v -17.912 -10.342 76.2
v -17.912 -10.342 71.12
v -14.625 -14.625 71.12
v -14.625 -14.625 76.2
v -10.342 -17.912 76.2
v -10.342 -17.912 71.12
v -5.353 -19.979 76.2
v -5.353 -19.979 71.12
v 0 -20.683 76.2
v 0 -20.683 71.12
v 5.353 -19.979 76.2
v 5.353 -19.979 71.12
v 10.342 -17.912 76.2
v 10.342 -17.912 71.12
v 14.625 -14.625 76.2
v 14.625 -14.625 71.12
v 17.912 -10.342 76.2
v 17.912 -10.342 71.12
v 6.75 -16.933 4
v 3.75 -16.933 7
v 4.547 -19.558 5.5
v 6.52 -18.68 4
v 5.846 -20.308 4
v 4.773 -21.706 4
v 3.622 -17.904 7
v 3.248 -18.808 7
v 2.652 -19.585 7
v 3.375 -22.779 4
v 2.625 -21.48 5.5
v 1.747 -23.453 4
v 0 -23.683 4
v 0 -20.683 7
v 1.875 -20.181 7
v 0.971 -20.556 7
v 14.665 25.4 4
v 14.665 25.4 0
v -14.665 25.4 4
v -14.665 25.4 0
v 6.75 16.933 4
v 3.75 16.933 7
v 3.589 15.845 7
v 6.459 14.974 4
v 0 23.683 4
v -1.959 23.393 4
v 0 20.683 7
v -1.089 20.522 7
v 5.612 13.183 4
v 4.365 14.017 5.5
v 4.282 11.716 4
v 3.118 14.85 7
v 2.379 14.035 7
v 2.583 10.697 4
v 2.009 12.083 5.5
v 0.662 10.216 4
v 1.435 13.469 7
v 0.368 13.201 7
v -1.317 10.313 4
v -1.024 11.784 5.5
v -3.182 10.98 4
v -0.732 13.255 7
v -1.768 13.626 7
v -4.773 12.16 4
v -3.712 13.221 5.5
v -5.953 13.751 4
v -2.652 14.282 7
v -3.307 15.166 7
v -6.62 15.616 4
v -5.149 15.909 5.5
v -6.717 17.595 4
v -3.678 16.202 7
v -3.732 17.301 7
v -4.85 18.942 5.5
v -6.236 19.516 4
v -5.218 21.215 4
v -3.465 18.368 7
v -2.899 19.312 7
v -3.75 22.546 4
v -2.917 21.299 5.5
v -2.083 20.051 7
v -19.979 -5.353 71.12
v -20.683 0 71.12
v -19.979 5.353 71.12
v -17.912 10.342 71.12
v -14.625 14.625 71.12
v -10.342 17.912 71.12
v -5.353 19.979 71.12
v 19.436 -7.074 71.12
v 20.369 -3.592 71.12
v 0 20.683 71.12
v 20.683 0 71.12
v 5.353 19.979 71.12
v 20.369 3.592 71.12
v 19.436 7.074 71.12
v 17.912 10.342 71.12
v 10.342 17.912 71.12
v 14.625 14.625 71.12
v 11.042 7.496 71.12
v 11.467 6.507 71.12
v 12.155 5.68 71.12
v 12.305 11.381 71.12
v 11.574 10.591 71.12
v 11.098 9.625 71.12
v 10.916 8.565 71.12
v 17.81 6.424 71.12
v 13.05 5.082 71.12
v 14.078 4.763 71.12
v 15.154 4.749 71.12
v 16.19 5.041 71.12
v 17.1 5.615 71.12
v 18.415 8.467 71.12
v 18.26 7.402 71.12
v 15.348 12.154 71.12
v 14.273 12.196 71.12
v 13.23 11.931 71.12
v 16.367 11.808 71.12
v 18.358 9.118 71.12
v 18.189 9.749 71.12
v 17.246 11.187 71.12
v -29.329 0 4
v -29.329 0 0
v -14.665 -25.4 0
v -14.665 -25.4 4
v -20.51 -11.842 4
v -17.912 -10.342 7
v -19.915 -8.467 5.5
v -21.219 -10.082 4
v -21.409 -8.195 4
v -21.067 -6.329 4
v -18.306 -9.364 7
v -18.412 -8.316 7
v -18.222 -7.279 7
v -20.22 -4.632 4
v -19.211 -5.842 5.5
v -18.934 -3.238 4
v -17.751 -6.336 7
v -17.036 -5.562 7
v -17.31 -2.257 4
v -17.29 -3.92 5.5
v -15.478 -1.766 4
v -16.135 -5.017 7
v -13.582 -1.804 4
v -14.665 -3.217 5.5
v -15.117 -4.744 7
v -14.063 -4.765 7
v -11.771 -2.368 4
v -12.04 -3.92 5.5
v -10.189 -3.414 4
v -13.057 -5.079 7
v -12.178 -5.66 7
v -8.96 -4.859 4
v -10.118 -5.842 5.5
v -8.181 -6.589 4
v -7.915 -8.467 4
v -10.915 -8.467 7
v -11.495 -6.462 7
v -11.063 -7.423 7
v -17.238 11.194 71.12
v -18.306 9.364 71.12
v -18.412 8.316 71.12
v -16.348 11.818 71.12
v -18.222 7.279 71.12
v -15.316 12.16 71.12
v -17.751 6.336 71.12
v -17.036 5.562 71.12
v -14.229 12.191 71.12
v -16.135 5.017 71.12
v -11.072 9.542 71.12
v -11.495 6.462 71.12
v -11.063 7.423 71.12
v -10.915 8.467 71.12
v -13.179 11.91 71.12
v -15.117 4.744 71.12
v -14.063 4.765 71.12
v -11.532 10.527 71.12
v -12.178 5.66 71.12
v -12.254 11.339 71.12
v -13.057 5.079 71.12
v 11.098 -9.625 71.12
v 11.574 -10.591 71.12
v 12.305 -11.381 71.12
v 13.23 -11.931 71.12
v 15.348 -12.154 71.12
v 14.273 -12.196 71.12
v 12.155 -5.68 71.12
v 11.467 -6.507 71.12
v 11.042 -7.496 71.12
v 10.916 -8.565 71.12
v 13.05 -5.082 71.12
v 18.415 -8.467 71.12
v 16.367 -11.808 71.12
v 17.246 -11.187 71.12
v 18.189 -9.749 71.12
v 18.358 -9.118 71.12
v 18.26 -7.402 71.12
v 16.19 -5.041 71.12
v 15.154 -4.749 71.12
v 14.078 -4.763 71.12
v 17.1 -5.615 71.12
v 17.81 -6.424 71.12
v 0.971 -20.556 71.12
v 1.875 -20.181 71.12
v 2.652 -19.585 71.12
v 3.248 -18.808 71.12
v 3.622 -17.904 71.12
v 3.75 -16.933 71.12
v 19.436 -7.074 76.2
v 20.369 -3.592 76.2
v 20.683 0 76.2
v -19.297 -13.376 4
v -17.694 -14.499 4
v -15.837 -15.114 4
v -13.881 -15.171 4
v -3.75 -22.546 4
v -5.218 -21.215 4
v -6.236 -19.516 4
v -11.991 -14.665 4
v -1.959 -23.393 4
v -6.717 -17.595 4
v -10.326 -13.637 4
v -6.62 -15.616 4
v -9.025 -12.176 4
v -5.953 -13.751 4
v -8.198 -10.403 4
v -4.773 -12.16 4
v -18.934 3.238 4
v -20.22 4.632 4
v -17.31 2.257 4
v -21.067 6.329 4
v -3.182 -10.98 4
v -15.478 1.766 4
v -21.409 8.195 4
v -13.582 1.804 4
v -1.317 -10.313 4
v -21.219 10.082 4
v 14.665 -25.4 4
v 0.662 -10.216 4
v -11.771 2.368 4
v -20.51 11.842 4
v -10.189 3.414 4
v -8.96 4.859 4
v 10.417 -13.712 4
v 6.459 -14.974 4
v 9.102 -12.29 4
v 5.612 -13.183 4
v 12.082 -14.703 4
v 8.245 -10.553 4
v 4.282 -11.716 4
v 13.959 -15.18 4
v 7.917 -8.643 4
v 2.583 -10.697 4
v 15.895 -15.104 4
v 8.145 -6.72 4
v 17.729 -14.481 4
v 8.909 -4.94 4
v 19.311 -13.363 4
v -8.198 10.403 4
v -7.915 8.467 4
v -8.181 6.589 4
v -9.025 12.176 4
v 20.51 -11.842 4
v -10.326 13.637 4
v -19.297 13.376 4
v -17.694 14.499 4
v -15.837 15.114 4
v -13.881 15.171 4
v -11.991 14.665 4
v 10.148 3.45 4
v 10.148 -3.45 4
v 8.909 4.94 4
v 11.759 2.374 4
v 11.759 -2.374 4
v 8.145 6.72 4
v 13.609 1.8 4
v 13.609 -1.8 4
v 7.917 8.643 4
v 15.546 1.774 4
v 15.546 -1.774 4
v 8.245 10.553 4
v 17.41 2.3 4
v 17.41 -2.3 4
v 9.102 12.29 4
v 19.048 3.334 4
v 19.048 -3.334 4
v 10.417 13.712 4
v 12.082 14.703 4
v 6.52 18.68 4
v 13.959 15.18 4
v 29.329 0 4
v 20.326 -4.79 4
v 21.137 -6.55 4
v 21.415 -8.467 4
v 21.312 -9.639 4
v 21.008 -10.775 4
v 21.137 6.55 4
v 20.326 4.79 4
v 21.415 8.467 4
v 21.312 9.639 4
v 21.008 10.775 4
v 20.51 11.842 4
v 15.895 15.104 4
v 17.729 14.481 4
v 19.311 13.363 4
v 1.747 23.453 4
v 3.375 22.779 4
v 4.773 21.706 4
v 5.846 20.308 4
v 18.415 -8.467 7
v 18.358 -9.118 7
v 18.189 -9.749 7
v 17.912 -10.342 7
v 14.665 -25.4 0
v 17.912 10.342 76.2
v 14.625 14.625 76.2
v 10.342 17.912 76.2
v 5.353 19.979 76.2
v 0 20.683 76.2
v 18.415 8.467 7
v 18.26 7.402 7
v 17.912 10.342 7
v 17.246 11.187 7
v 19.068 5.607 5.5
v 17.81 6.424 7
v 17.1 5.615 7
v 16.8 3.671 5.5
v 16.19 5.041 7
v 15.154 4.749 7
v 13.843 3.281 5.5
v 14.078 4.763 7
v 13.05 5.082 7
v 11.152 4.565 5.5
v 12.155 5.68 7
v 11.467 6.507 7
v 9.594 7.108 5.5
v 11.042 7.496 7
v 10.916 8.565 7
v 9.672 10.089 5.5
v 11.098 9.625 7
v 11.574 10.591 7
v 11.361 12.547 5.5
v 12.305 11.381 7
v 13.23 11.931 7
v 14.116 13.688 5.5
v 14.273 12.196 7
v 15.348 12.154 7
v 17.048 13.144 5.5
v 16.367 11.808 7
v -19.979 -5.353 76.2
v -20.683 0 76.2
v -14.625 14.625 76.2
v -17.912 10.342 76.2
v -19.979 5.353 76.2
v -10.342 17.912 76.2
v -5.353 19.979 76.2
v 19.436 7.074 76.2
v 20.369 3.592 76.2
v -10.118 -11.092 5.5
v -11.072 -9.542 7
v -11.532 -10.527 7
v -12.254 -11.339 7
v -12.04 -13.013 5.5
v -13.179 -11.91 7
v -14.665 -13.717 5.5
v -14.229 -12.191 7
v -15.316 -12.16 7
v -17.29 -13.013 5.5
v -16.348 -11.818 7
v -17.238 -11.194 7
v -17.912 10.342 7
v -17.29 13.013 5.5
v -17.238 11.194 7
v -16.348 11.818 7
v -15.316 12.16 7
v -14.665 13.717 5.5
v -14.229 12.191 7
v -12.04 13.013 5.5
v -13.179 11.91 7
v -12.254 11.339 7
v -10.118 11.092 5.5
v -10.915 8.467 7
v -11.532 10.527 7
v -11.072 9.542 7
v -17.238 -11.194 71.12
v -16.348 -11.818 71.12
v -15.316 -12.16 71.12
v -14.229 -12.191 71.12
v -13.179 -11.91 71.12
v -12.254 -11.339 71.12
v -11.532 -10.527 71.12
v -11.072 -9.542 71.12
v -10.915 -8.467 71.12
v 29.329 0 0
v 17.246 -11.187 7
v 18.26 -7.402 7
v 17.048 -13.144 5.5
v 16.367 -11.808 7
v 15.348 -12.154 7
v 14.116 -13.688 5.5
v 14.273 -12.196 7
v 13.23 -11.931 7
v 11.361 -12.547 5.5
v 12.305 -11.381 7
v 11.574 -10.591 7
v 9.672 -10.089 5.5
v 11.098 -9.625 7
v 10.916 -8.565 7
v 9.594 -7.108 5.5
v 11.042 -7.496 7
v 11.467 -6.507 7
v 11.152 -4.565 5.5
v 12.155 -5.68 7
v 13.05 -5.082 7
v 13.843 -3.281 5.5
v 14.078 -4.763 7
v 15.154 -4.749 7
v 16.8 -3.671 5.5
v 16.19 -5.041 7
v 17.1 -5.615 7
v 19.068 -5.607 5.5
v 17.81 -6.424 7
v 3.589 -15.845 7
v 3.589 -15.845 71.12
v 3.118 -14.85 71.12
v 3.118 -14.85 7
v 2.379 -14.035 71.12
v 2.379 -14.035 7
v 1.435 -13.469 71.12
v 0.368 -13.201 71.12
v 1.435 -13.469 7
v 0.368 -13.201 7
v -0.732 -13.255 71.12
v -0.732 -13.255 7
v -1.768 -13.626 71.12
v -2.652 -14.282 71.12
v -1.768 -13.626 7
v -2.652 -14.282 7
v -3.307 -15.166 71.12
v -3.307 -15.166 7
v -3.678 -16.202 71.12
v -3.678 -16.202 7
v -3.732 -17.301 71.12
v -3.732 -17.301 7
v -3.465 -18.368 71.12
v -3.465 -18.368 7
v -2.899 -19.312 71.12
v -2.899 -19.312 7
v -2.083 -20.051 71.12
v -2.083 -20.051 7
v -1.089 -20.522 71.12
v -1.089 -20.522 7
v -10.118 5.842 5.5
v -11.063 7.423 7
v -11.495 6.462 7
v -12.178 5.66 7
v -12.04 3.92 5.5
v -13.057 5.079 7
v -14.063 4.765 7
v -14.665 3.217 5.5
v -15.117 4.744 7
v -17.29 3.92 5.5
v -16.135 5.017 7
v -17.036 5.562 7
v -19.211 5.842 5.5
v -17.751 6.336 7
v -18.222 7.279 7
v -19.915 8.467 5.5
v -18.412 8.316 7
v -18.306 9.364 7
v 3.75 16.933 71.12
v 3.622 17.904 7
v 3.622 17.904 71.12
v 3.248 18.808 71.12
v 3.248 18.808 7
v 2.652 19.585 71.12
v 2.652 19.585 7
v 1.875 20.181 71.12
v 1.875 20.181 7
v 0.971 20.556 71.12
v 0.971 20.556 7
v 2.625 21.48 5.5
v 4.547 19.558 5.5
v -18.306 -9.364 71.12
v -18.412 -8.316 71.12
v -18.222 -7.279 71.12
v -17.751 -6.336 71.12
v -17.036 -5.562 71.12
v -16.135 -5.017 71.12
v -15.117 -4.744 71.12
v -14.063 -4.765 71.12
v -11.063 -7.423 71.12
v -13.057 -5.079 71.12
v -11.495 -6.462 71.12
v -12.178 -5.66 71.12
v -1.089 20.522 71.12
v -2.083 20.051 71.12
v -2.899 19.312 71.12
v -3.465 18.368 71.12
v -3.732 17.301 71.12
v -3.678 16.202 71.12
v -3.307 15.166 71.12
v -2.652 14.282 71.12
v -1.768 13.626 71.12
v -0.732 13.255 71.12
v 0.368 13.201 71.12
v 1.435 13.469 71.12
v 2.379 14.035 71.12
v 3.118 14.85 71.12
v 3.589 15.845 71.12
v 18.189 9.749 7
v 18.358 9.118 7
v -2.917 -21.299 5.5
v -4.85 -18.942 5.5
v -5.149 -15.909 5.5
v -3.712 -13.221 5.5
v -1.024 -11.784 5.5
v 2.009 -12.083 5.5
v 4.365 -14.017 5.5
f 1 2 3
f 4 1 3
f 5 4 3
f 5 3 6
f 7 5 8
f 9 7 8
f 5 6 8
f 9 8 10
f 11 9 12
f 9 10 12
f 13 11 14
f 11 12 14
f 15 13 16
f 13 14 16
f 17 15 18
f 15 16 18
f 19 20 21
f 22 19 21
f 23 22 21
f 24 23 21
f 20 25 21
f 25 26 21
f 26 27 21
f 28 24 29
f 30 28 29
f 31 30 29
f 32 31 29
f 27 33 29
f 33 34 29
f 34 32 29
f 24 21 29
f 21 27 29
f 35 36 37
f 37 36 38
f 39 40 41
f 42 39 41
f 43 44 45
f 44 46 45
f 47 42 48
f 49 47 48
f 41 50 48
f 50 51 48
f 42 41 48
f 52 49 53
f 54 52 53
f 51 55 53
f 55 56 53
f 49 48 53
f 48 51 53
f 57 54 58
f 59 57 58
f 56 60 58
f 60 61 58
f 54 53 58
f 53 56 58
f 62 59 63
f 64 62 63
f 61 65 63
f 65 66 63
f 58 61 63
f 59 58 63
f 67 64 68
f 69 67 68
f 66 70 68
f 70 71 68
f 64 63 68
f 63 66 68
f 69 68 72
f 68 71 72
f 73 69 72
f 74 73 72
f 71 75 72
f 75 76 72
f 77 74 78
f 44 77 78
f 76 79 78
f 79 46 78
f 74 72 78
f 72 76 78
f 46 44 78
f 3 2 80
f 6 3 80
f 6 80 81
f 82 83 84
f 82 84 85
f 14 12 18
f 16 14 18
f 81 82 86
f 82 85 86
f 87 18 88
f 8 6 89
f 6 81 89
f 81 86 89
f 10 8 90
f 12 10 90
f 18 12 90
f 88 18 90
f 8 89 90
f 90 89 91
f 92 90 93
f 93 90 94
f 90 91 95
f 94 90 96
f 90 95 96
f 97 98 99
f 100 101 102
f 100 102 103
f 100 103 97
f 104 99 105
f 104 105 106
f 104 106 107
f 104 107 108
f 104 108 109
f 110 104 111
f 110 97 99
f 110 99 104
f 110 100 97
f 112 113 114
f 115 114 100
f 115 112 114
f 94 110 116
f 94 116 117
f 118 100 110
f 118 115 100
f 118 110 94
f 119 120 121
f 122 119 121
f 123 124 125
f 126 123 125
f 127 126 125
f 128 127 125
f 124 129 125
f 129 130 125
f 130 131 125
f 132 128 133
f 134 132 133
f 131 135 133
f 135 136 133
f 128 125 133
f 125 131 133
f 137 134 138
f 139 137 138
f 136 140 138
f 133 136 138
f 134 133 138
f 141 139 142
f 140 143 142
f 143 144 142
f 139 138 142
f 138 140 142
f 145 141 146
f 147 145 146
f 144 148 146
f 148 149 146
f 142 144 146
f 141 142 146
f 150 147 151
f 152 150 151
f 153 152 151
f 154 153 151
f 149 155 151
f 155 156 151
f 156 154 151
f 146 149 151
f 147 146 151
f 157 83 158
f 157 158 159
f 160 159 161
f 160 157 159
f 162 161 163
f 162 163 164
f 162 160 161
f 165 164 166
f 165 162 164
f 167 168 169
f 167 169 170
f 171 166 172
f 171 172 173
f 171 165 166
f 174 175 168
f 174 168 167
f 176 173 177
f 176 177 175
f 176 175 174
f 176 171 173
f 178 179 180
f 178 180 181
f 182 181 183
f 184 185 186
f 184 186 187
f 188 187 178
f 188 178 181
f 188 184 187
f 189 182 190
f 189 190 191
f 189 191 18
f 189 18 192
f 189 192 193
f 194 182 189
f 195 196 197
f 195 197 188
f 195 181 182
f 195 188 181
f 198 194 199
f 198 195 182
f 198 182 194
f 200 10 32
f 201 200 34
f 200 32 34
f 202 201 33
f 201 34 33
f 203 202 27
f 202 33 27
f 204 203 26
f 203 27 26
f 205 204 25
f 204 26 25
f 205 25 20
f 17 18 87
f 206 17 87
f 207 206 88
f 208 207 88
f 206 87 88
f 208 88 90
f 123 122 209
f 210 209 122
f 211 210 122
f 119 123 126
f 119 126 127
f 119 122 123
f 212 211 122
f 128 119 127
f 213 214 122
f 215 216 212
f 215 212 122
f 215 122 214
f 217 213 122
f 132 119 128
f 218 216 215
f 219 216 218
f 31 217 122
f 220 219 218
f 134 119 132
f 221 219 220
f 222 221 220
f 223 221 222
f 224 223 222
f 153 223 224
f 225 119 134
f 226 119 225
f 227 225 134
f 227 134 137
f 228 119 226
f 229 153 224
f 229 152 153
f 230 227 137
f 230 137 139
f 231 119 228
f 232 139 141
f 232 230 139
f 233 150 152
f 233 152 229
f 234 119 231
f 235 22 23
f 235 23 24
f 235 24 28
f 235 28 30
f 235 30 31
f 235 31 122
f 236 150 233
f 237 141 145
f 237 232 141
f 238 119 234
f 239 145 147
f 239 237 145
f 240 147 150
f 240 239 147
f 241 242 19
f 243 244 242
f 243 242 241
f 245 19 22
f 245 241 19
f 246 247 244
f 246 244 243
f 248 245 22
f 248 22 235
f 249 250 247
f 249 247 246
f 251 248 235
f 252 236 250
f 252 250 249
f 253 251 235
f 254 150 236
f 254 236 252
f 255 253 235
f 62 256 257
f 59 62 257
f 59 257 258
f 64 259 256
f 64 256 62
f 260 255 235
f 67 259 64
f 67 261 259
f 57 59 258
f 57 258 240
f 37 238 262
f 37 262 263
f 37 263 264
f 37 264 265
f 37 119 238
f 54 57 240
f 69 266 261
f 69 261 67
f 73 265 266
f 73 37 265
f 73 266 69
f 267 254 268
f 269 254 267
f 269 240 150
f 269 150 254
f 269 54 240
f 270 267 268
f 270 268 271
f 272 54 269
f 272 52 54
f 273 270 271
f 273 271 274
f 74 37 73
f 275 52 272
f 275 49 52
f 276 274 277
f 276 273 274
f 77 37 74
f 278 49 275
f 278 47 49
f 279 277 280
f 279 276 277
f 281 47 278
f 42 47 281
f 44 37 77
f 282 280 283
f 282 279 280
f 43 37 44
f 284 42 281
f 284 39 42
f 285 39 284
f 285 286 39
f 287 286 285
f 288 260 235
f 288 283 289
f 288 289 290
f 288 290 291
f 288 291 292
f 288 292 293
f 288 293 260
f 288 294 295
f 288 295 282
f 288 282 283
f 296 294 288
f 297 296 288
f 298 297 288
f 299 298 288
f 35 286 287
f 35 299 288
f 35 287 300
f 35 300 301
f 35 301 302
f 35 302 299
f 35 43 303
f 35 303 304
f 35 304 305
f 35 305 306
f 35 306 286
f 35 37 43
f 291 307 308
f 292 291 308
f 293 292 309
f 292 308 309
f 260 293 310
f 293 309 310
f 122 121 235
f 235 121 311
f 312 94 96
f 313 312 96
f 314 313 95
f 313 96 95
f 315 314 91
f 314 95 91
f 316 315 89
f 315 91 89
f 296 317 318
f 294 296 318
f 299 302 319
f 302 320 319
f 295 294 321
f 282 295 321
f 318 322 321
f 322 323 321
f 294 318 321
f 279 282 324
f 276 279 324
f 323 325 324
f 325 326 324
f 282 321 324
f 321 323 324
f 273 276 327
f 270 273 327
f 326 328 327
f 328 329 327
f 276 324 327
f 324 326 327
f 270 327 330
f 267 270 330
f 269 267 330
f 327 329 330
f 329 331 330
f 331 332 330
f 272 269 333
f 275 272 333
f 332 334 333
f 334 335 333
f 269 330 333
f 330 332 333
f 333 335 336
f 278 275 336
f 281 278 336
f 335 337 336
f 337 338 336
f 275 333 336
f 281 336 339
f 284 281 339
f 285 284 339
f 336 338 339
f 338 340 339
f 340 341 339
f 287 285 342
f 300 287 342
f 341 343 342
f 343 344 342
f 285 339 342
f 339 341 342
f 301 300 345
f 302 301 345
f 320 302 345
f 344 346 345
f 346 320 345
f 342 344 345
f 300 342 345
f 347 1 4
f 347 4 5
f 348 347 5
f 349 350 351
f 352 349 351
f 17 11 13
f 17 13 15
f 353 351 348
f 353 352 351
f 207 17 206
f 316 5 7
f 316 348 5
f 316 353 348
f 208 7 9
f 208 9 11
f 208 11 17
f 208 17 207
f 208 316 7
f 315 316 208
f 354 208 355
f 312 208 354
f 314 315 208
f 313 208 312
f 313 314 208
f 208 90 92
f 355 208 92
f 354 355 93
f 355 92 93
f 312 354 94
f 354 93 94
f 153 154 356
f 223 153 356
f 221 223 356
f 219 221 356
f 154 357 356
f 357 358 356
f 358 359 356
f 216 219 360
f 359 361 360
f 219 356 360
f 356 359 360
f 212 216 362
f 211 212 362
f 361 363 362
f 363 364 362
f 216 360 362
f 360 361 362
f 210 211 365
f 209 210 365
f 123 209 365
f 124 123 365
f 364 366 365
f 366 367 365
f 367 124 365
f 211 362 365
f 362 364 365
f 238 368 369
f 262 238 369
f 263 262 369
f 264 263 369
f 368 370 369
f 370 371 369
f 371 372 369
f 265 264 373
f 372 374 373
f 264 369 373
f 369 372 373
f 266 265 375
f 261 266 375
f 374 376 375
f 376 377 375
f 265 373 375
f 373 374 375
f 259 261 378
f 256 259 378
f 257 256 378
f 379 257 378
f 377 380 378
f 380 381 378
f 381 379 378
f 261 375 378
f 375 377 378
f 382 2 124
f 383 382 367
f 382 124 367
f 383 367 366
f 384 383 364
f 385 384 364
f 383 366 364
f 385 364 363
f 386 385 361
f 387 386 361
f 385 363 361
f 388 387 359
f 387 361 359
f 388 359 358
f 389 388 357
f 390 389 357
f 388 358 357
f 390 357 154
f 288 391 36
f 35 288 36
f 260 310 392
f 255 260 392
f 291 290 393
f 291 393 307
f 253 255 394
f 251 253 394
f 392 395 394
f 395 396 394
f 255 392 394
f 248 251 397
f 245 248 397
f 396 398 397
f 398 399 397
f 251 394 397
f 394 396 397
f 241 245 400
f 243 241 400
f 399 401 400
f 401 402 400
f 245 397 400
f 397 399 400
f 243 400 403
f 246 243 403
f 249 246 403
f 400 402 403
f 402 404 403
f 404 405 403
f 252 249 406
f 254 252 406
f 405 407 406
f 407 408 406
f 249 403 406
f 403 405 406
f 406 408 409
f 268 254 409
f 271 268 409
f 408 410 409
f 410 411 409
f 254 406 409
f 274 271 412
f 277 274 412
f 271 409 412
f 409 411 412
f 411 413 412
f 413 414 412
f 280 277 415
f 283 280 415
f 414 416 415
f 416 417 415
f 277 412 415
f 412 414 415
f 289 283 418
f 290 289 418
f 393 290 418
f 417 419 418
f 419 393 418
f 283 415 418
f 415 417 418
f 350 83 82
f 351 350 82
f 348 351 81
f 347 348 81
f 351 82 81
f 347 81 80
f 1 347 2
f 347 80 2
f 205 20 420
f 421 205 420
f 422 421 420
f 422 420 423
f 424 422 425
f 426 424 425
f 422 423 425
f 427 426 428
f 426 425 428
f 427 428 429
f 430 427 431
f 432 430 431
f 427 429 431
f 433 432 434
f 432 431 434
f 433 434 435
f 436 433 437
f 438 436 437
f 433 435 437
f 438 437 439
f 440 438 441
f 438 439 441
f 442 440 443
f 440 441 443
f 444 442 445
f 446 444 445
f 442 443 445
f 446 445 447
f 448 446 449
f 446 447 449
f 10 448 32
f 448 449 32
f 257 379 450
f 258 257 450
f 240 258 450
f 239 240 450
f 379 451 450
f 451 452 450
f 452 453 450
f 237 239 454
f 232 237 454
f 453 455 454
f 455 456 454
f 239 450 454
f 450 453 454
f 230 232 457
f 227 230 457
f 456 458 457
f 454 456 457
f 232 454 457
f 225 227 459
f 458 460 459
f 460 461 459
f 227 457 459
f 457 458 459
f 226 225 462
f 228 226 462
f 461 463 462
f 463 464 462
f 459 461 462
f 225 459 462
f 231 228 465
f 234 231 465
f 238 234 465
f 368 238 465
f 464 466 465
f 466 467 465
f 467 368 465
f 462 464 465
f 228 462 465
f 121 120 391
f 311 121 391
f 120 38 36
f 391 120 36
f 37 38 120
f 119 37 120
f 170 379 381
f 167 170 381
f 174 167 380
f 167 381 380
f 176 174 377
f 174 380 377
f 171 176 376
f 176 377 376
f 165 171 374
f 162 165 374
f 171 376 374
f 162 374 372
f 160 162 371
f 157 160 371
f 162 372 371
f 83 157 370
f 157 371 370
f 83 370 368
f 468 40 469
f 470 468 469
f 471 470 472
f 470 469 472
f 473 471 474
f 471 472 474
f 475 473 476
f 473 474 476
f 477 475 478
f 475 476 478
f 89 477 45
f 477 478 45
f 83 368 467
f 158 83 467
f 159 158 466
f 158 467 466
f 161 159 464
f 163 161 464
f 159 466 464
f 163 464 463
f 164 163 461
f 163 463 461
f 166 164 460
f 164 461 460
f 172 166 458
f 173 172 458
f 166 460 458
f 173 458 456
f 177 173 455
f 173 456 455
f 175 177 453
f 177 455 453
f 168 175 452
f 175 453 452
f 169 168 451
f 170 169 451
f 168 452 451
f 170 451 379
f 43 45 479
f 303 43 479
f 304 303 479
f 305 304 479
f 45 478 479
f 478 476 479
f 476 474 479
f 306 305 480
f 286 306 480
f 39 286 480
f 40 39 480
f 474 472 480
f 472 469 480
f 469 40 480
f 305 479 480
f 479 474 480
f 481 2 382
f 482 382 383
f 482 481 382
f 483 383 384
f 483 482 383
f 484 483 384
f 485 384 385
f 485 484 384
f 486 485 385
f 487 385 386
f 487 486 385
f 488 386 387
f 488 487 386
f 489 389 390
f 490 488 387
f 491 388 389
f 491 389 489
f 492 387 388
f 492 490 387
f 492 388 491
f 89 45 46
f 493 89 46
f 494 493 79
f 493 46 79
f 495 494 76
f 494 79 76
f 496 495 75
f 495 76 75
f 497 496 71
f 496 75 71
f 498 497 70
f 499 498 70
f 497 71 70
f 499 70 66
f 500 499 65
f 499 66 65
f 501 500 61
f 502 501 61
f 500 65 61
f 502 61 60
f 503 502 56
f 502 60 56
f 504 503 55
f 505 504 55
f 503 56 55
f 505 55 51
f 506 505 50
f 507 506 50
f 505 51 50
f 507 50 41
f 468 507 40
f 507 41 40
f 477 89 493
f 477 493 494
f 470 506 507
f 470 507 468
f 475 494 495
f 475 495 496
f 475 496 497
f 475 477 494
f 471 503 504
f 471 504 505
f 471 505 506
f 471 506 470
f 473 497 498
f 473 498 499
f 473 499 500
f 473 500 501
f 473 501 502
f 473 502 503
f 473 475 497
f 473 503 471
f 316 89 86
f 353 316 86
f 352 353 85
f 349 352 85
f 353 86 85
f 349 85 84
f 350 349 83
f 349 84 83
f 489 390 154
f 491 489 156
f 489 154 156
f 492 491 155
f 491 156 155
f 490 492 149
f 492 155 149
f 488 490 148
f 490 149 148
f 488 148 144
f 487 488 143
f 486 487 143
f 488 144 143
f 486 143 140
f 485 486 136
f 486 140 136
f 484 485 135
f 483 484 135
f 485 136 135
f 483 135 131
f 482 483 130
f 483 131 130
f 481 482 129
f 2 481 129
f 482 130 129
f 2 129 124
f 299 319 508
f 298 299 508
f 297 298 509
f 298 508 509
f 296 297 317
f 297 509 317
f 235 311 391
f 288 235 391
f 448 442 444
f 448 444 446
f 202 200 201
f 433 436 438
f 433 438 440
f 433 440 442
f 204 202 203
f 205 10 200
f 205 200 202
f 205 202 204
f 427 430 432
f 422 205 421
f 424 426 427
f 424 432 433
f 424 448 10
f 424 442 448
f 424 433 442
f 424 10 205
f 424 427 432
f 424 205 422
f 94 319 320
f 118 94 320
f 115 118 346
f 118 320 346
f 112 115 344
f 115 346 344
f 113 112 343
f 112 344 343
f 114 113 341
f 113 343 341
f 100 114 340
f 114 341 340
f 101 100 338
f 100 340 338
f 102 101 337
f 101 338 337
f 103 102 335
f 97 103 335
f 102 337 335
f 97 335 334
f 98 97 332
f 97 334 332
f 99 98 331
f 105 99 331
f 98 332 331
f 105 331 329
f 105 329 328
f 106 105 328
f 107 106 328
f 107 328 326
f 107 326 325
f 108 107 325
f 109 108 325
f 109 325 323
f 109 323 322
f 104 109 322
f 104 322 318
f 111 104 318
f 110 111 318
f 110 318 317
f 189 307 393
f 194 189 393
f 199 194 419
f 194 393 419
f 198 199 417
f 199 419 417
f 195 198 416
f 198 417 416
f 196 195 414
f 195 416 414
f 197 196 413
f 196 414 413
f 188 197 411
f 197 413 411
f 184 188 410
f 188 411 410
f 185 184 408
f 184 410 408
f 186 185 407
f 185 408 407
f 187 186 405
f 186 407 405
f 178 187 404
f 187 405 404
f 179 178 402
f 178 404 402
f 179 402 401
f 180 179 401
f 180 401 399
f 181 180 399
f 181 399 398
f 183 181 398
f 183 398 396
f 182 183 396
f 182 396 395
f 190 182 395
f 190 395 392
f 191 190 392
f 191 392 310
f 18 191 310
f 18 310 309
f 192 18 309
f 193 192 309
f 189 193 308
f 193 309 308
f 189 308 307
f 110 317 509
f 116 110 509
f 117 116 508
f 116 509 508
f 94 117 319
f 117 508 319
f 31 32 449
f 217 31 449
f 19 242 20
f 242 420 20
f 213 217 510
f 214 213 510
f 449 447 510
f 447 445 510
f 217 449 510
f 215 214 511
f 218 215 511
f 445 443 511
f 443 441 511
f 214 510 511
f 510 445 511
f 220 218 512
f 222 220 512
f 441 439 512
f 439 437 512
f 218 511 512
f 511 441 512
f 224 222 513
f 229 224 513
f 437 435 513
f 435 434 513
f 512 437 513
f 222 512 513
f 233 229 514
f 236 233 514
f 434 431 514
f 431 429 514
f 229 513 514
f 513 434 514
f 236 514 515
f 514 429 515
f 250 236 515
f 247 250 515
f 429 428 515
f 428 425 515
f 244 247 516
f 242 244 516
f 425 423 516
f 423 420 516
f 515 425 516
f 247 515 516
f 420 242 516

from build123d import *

# Parameters (mm, degrees)
F1_DEPTH = 4
F2_DEPTH = 71.12
F3_START = 71.12
F3_DEPTH = 5.08
F4_SIZE  = 3


with BuildPart() as f1:
    # F0 (on Top) → F1 (new body)
    with BuildSketch(Plane.XY):
        Polygon((14.6646968374, 25.4), (-14.6646968374, 25.4), (-29.3293936748, 0), (-14.6646968374, -25.4), (14.6646968374, -25.4), (29.3293936748, 0), align=None)
        with BuildLine():
            ThreePointArc((-17.9122922144, -10.3416664713), (-20.6833333333, 1.129e-07), (-17.9122921015, 10.3416666669))
            ThreePointArc((-17.9122921015, 10.3416666669), (-10.3416666665, 17.9122921017), (0, 20.6833333333))
            ThreePointArc((0, 20.6833333333), (10.3416667666, 17.9122920439), (17.912292217, 10.3416664668))
            ThreePointArc((17.912292217, 10.3416664668), (19.9785658703, 5.3532404714), (20.6833333333, 0))
            ThreePointArc((20.6833333333, 0), (19.9785658556, -5.3532405263), (17.9122921602, -10.3416665652))
            ThreePointArc((17.9122921602, -10.3416665652), (10.3416666949, -17.9122920853), (-5.2e-08, -20.6833333333))
            ThreePointArc((-5.2e-08, -20.6833333333), (-10.3416667868, -17.9122920322), (-17.9122922144, -10.3416664713))
        make_face(mode=Mode.SUBTRACT)
        with BuildLine():
            ThreePointArc((0, 20.6833333333), (-10.3416666665, 17.9122921017), (-17.9122921015, 10.3416666669))
            ThreePointArc((-17.9122921015, 10.3416666669), (-20.6833333333, 1.129e-07), (-17.9122922144, -10.3416664713))
            ThreePointArc((-17.9122922144, -10.3416664713), (-10.3416667868, -17.9122920322), (-5.2e-08, -20.6833333333))
            ThreePointArc((-5.2e-08, -20.6833333333), (10.3416666949, -17.9122920853), (17.9122921602, -10.3416665652))
            ThreePointArc((17.9122921602, -10.3416665652), (19.9785658556, -5.3532405263), (20.6833333333, 0))
            ThreePointArc((20.6833333333, 0), (19.9785658703, 5.3532404714), (17.912292217, 10.3416664668))
            ThreePointArc((17.912292217, 10.3416664668), (10.3416667666, 17.9122920439), (0, 20.6833333333))
        make_face()
        with BuildLine():
            ThreePointArc((-10.9146968374, -8.4666666667), (-13.6941255272, -12.0888885444), (-17.9122922144, -10.3416664713))
            ThreePointArc((-17.9122922144, -10.3416664713), (-15.6352681476, -4.8444447889), (-10.9146968374, -8.4666666667))
        make_face(mode=Mode.SUBTRACT)
        with BuildLine():
            ThreePointArc((3.75, -16.9333333333), (2.6516504111, -19.5849837812), (-5.2e-08, -20.6833333333))
            ThreePointArc((-5.2e-08, -20.6833333333), (-2.6516504111, -14.2816828855), (3.75, -16.9333333333))
        make_face(mode=Mode.SUBTRACT)
        with BuildLine():
            ThreePointArc((18.4146968374, -8.4666666667), (18.2869187012, -9.4372380292), (17.9122921602, -10.3416665652))
            ThreePointArc((17.9122921602, -10.3416665652), (11.0424749737, -7.4960953041), (18.4146968374, -8.4666666667))
        make_face(mode=Mode.SUBTRACT)
        with BuildLine():
            ThreePointArc((-17.9122921015, 10.3416666669), (-13.6941254181, 12.0888885152), (-10.9146968374, 8.4666666667))
            ThreePointArc((-10.9146968374, 8.4666666667), (-15.6352682567, 4.8444448181), (-17.9122921015, 10.3416666669))
        make_face(mode=Mode.SUBTRACT)
        with BuildLine():
            ThreePointArc((18.4146968374, 8.4666666667), (11.042474959, 7.496095359), (17.912292217, 10.3416664668))
            ThreePointArc((17.912292217, 10.3416664668), (18.2869187159, 9.4372379743), (18.4146968374, 8.4666666667))
        make_face(mode=Mode.SUBTRACT)
        with BuildLine():
            ThreePointArc((3.75, 16.9333333333), (-2.6516504294, 14.2816829039), (0, 20.6833333333))
            ThreePointArc((0, 20.6833333333), (2.6516504294, 19.5849837628), (3.75, 16.9333333333))
        make_face(mode=Mode.SUBTRACT)
        with BuildLine():
            ThreePointArc((-17.9122921015, 10.3416666669), (-15.6352682567, 4.8444448181), (-10.9146968374, 8.4666666667))
            ThreePointArc((-10.9146968374, 8.4666666667), (-13.6941254181, 12.0888885152), (-17.9122921015, 10.3416666669))
        make_face()
        with BuildLine():
            ThreePointArc((3.75, 16.9333333333), (2.6516504294, 19.5849837628), (0, 20.6833333333))
            ThreePointArc((0, 20.6833333333), (-2.6516504294, 14.2816829039), (3.75, 16.9333333333))
        make_face()
        with BuildLine():
            ThreePointArc((18.4146968374, 8.4666666667), (18.2869187159, 9.4372379743), (17.912292217, 10.3416664668))
            ThreePointArc((17.912292217, 10.3416664668), (11.042474959, 7.496095359), (18.4146968374, 8.4666666667))
        make_face()
        with BuildLine():
            ThreePointArc((18.4146968374, -8.4666666667), (11.0424749737, -7.4960953041), (17.9122921602, -10.3416665652))
            ThreePointArc((17.9122921602, -10.3416665652), (18.2869187012, -9.4372380292), (18.4146968374, -8.4666666667))
        make_face()
        with BuildLine():
            ThreePointArc((-10.9146968374, -8.4666666667), (-15.6352681476, -4.8444447889), (-17.9122922144, -10.3416664713))
            ThreePointArc((-17.9122922144, -10.3416664713), (-13.6941255272, -12.0888885444), (-10.9146968374, -8.4666666667))
        make_face()
        with BuildLine():
            ThreePointArc((3.75, -16.9333333333), (-2.6516504111, -14.2816828855), (-5.2e-08, -20.6833333333))
            ThreePointArc((-5.2e-08, -20.6833333333), (2.6516504111, -19.5849837812), (3.75, -16.9333333333))
        make_face()
    extrude(amount=F1_DEPTH)

    # F0 (on Top) → F2 (join)
    with BuildSketch(Plane.XY):
        with BuildLine():
            ThreePointArc((3.75, 16.9333333333), (2.6516504294, 19.5849837628), (0, 20.6833333333))
            ThreePointArc((0, 20.6833333333), (-2.6516504294, 14.2816829039), (3.75, 16.9333333333))
        make_face()
        with BuildLine():
            ThreePointArc((-17.9122921015, 10.3416666669), (-15.6352682567, 4.8444448181), (-10.9146968374, 8.4666666667))
            ThreePointArc((-10.9146968374, 8.4666666667), (-13.6941254181, 12.0888885152), (-17.9122921015, 10.3416666669))
        make_face()
        with BuildLine():
            ThreePointArc((18.4146968374, 8.4666666667), (18.2869187159, 9.4372379743), (17.912292217, 10.3416664668))
            ThreePointArc((17.912292217, 10.3416664668), (11.042474959, 7.496095359), (18.4146968374, 8.4666666667))
        make_face()
        with BuildLine():
            ThreePointArc((18.4146968374, -8.4666666667), (11.0424749737, -7.4960953041), (17.9122921602, -10.3416665652))
            ThreePointArc((17.9122921602, -10.3416665652), (18.2869187012, -9.4372380292), (18.4146968374, -8.4666666667))
        make_face()
        with BuildLine():
            ThreePointArc((3.75, -16.9333333333), (-2.6516504111, -14.2816828855), (-5.2e-08, -20.6833333333))
            ThreePointArc((-5.2e-08, -20.6833333333), (2.6516504111, -19.5849837812), (3.75, -16.9333333333))
        make_face()
        with BuildLine():
            ThreePointArc((-10.9146968374, -8.4666666667), (-15.6352681476, -4.8444447889), (-17.9122922144, -10.3416664713))
            ThreePointArc((-17.9122922144, -10.3416664713), (-13.6941255272, -12.0888885444), (-10.9146968374, -8.4666666667))
        make_face()
    extrude(amount=F2_DEPTH)

    # F4
    f4_edges = [f1.edges().sort_by_distance(p)[0] for p in [
        (11.417102, -6.591667, 4),
        (-3.75, -16.933333, 4),
        (11.417101, 6.591667, 4),
        (-3.75, 16.933333, 4),
        (-11.417102, 6.591667, 4),
        (-11.417101, -6.591667, 4),
    ]]
    chamfer(f4_edges, length=F4_SIZE)


with BuildPart() as f3:
    # F0 (on Top) → F3 (new body)
    with BuildSketch(Plane.XY.offset(F3_START)):
        with BuildLine():
            ThreePointArc((0, 20.6833333333), (-10.3416666665, 17.9122921017), (-17.9122921015, 10.3416666669))
            ThreePointArc((-17.9122921015, 10.3416666669), (-20.6833333333, 1.129e-07), (-17.9122922144, -10.3416664713))
            ThreePointArc((-17.9122922144, -10.3416664713), (-10.3416667868, -17.9122920322), (-5.2e-08, -20.6833333333))
            ThreePointArc((-5.2e-08, -20.6833333333), (10.3416666949, -17.9122920853), (17.9122921602, -10.3416665652))
            ThreePointArc((17.9122921602, -10.3416665652), (19.9785658556, -5.3532405263), (20.6833333333, 0))
            ThreePointArc((20.6833333333, 0), (19.9785658703, 5.3532404714), (17.912292217, 10.3416664668))
            ThreePointArc((17.912292217, 10.3416664668), (10.3416667666, 17.9122920439), (0, 20.6833333333))
        make_face()
        with BuildLine():
            ThreePointArc((-10.9146968374, -8.4666666667), (-13.6941255272, -12.0888885444), (-17.9122922144, -10.3416664713))
            ThreePointArc((-17.9122922144, -10.3416664713), (-15.6352681476, -4.8444447889), (-10.9146968374, -8.4666666667))
        make_face(mode=Mode.SUBTRACT)
        with BuildLine():
            ThreePointArc((3.75, -16.9333333333), (2.6516504111, -19.5849837812), (-5.2e-08, -20.6833333333))
            ThreePointArc((-5.2e-08, -20.6833333333), (-2.6516504111, -14.2816828855), (3.75, -16.9333333333))
        make_face(mode=Mode.SUBTRACT)
        with BuildLine():
            ThreePointArc((18.4146968374, -8.4666666667), (18.2869187012, -9.4372380292), (17.9122921602, -10.3416665652))
            ThreePointArc((17.9122921602, -10.3416665652), (11.0424749737, -7.4960953041), (18.4146968374, -8.4666666667))
        make_face(mode=Mode.SUBTRACT)
        with BuildLine():
            ThreePointArc((-17.9122921015, 10.3416666669), (-13.6941254181, 12.0888885152), (-10.9146968374, 8.4666666667))
            ThreePointArc((-10.9146968374, 8.4666666667), (-15.6352682567, 4.8444448181), (-17.9122921015, 10.3416666669))
        make_face(mode=Mode.SUBTRACT)
        with BuildLine():
            ThreePointArc((18.4146968374, 8.4666666667), (11.042474959, 7.496095359), (17.912292217, 10.3416664668))
            ThreePointArc((17.912292217, 10.3416664668), (18.2869187159, 9.4372379743), (18.4146968374, 8.4666666667))
        make_face(mode=Mode.SUBTRACT)
        with BuildLine():
            ThreePointArc((3.75, 16.9333333333), (-2.6516504294, 14.2816829039), (0, 20.6833333333))
            ThreePointArc((0, 20.6833333333), (2.6516504294, 19.5849837628), (3.75, 16.9333333333))
        make_face(mode=Mode.SUBTRACT)
        with BuildLine():
            ThreePointArc((3.75, -16.9333333333), (-2.6516504111, -14.2816828855), (-5.2e-08, -20.6833333333))
            ThreePointArc((-5.2e-08, -20.6833333333), (2.6516504111, -19.5849837812), (3.75, -16.9333333333))
        make_face()
        with BuildLine():
            ThreePointArc((18.4146968374, -8.4666666667), (11.0424749737, -7.4960953041), (17.9122921602, -10.3416665652))
            ThreePointArc((17.9122921602, -10.3416665652), (18.2869187012, -9.4372380292), (18.4146968374, -8.4666666667))
        make_face()
        with BuildLine():
            ThreePointArc((18.4146968374, 8.4666666667), (18.2869187159, 9.4372379743), (17.912292217, 10.3416664668))
            ThreePointArc((17.912292217, 10.3416664668), (11.042474959, 7.496095359), (18.4146968374, 8.4666666667))
        make_face()
        with BuildLine():
            ThreePointArc((-10.9146968374, -8.4666666667), (-15.6352681476, -4.8444447889), (-17.9122922144, -10.3416664713))
            ThreePointArc((-17.9122922144, -10.3416664713), (-13.6941255272, -12.0888885444), (-10.9146968374, -8.4666666667))
        make_face()
        with BuildLine():
            ThreePointArc((-17.9122921015, 10.3416666669), (-15.6352682567, 4.8444448181), (-10.9146968374, 8.4666666667))
            ThreePointArc((-10.9146968374, 8.4666666667), (-13.6941254181, 12.0888885152), (-17.9122921015, 10.3416666669))
        make_face()
        with BuildLine():
            ThreePointArc((3.75, 16.9333333333), (2.6516504294, 19.5849837628), (0, 20.6833333333))
            ThreePointArc((0, 20.6833333333), (-2.6516504294, 14.2816829039), (3.75, 16.9333333333))
        make_face()
    extrude(amount=F3_DEPTH)


solid = Compound([f1.part, f3.part])
